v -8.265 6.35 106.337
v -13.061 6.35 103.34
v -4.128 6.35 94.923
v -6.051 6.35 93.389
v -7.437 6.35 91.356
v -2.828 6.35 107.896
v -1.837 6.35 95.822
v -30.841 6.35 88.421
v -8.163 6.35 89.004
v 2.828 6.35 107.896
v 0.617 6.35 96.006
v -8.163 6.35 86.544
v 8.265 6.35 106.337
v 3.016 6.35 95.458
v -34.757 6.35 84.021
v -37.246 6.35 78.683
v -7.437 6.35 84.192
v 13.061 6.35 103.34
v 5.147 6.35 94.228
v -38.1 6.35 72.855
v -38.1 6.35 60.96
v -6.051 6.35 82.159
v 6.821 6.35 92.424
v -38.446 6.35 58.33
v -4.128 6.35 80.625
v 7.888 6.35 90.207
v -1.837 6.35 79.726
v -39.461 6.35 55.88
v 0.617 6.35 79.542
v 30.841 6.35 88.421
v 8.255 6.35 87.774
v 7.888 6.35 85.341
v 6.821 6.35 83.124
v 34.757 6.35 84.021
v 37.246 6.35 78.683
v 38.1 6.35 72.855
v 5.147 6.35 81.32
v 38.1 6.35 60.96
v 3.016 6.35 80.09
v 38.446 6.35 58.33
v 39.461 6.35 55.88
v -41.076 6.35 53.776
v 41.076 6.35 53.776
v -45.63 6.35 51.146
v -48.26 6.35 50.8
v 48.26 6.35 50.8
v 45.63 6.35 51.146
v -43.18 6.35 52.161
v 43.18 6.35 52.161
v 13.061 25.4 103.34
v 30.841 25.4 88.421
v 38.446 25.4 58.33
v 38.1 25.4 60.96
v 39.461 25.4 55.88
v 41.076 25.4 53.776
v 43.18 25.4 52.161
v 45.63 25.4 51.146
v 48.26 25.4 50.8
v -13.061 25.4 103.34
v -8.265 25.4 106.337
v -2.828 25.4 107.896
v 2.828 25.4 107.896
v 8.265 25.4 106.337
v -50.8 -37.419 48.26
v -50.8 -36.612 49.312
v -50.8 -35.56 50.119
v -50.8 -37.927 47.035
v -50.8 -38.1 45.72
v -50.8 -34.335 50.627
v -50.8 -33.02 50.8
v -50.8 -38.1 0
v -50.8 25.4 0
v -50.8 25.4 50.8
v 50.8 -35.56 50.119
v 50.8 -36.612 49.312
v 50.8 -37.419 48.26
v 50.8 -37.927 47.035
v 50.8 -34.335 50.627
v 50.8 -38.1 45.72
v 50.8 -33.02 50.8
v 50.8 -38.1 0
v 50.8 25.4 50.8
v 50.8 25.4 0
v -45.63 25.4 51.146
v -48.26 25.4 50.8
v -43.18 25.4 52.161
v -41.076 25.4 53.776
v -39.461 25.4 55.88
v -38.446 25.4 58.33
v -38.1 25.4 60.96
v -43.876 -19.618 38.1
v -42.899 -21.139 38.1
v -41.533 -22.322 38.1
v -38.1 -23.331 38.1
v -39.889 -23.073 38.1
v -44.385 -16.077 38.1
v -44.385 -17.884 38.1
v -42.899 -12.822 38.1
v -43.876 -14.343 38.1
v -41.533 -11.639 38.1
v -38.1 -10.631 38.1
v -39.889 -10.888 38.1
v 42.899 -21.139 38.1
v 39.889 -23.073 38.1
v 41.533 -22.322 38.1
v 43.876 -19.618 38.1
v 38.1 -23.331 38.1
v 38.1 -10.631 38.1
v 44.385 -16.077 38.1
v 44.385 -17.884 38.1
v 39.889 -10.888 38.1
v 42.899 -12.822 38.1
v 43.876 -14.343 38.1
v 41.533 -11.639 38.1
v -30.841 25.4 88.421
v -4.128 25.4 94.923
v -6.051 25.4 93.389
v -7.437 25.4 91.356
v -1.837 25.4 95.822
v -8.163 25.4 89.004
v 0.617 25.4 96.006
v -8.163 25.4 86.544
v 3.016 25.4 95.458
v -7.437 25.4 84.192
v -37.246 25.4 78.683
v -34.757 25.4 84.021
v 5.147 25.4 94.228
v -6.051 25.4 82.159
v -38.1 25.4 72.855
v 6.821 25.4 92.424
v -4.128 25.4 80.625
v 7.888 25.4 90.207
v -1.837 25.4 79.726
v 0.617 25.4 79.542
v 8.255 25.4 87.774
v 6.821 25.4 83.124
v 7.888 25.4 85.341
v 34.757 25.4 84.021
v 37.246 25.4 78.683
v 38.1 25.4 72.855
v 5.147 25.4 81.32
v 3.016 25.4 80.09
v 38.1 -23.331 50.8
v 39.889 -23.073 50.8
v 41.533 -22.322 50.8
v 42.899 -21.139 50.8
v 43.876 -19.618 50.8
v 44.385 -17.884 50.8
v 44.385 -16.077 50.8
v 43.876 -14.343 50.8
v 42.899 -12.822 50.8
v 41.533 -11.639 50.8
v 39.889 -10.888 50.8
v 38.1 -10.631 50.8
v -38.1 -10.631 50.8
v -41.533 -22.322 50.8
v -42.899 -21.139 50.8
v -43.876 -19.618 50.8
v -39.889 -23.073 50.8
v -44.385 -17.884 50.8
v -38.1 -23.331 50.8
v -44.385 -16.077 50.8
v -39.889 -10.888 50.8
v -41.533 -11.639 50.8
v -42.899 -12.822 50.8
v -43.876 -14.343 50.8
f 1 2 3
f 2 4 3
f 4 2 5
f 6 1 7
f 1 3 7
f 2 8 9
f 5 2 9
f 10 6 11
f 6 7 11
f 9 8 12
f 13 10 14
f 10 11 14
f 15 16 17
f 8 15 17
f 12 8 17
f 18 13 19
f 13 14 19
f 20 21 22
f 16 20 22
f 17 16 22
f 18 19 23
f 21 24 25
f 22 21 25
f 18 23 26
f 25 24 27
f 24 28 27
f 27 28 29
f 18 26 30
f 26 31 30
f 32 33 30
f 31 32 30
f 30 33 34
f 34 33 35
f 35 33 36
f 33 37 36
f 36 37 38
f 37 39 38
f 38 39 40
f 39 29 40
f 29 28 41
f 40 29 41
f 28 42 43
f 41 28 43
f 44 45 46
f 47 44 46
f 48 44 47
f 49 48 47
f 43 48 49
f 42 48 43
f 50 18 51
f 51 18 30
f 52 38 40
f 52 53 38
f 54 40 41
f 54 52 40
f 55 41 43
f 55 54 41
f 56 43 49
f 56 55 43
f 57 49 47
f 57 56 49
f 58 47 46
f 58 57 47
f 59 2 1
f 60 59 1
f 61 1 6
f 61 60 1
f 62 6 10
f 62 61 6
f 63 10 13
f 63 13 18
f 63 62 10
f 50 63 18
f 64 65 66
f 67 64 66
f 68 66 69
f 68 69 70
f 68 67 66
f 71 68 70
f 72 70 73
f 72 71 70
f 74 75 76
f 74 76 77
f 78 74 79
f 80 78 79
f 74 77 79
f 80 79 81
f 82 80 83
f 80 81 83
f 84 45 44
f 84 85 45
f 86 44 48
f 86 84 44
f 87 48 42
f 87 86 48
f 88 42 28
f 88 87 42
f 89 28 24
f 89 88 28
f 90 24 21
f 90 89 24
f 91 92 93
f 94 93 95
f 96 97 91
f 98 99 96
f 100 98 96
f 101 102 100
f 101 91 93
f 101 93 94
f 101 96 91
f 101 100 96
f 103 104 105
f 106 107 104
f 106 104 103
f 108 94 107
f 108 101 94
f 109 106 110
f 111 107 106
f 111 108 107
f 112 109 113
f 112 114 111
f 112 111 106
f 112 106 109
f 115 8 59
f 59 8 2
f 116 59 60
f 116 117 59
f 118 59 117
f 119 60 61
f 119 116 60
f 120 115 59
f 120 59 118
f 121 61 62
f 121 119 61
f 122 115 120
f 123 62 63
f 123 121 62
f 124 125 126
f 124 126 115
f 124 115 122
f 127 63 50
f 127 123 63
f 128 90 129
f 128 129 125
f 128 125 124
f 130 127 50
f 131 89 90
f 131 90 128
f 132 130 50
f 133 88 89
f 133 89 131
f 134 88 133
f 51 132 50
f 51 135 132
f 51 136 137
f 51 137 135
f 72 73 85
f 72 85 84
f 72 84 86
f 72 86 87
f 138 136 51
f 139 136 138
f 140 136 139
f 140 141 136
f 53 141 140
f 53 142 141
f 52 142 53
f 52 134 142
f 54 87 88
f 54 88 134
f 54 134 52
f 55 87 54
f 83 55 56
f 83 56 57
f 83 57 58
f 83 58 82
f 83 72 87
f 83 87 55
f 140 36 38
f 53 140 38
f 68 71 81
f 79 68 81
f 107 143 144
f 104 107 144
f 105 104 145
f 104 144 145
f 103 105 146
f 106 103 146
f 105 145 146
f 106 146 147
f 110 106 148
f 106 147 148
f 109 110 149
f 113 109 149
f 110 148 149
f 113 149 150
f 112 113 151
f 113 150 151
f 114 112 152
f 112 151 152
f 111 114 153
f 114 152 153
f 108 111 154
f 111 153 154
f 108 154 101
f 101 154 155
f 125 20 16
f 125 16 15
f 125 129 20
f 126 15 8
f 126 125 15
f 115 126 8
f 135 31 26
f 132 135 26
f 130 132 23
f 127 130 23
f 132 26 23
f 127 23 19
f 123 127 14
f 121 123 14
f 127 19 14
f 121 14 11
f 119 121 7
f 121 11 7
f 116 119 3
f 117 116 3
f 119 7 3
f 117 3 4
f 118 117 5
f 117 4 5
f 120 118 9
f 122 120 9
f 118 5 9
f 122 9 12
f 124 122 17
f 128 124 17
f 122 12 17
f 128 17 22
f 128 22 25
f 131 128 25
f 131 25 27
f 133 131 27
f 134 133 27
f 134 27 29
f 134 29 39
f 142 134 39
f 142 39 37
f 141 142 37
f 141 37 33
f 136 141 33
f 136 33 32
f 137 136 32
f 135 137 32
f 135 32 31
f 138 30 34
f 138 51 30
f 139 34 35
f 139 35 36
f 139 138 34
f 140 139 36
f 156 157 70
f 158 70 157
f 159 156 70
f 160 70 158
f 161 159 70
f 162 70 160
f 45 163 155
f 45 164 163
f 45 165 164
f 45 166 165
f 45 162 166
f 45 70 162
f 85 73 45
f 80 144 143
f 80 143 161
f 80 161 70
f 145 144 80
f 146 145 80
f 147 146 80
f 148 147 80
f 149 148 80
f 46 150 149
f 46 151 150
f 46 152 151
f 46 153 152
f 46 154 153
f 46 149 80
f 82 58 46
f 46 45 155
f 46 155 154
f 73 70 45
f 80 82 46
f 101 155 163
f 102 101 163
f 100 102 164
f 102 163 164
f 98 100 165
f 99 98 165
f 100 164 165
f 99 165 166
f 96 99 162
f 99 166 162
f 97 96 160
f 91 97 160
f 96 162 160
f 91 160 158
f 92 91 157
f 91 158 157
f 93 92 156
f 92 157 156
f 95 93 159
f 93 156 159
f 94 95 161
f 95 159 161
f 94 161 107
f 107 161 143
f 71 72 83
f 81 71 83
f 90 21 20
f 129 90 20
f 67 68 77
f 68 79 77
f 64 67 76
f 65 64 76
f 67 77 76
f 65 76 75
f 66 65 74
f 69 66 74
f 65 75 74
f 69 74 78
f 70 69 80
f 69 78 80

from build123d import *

# Parameters (mm, degrees)
F0_W      = 101.6
F0_H      = 63.5
F1_DEPTH  = 50.8
F2_R      = 5.08
F4_DEPTH  = 12.7
F5_W      = 101.6
F5_H      = 19.05
F6_DEPTH  = 63.5
F8_DEPTH  = 25.4
F9_R      = 20.32
F10_R     = 10.16
F11_R     = 8.255
F12_DEPTH = 25.4


with BuildPart() as f1:
    # F0 (on Top) → F1 (new body)
    with BuildSketch(Plane.XY):
        with Locations((0, -6.35)):
            Rectangle(F0_W, F0_H)
    extrude(amount=F1_DEPTH)

    # F2
    f2_edges = [f1.edges().sort_by_distance(p)[0] for p in [
        (0, -38.1, 50.8),
    ]]
    fillet(f2_edges, radius=F2_R)

    # F3 (on face) → F4 (cut)
    with BuildSketch(Plane.XY.offset(50.8)):
        with BuildLine():
            Line((38.1, -10.6305400074), (-38.1, -10.6305400074))
            ThreePointArc((-38.1, -10.6305400074), (-44.45, -16.9805400074), (-38.1, -23.3305400074))
            Line((-38.1, -23.3305400074), (38.1, -23.3305400074))
            ThreePointArc((38.1, -23.3305400074), (44.45, -16.9805400074), (38.1, -10.6305400074))
        make_face()
    extrude(amount=-F4_DEPTH, mode=Mode.SUBTRACT)

    # F5 (on face) → F6 (join)
    with BuildSketch(Plane.XY.offset(50.8)):
        with Locations((0, 15.875)):
            Rectangle(F5_W, F5_H)
    extrude(amount=F6_DEPTH)

    # F7 (on face) → F8 (cut)
    with BuildSketch(Plane.XZ.offset(-6.35)):
        Polygon((-50.8, 50.8), (-38.1, 50.8), (-38.1, 82.3303040521), (0, 114.3), (-50.8, 114.3), align=None)
        Polygon((38.1, 50.8), (50.8, 50.8), (50.8, 114.3), (0, 114.3), (38.1, 82.3303040521), align=None)
    extrude(amount=-F8_DEPTH, mode=Mode.SUBTRACT)

    # F9
    f9_edges = [f1.edges().sort_by_distance(p)[0] for p in [
        (38.1, 15.875, 82.330304),
        (-38.1, 15.875, 82.330304),
        (0, 15.875, 114.3),
    ]]
    fillet(f9_edges, radius=F9_R)

    # F10
    f10_edges = [f1.edges().sort_by_distance(p)[0] for p in [
        (38.1, 15.875, 50.8),
        (-38.1, 15.875, 50.8),
    ]]
    fillet(f10_edges, radius=F10_R)

    # F11 (on face) → F12 (cut)
    with BuildSketch(Plane.XZ.offset(-6.35)):
        with Locations((0, 87.7741238808)):
            Circle(F11_R)
    extrude(amount=-F12_DEPTH, mode=Mode.SUBTRACT)


solid = f1.part
